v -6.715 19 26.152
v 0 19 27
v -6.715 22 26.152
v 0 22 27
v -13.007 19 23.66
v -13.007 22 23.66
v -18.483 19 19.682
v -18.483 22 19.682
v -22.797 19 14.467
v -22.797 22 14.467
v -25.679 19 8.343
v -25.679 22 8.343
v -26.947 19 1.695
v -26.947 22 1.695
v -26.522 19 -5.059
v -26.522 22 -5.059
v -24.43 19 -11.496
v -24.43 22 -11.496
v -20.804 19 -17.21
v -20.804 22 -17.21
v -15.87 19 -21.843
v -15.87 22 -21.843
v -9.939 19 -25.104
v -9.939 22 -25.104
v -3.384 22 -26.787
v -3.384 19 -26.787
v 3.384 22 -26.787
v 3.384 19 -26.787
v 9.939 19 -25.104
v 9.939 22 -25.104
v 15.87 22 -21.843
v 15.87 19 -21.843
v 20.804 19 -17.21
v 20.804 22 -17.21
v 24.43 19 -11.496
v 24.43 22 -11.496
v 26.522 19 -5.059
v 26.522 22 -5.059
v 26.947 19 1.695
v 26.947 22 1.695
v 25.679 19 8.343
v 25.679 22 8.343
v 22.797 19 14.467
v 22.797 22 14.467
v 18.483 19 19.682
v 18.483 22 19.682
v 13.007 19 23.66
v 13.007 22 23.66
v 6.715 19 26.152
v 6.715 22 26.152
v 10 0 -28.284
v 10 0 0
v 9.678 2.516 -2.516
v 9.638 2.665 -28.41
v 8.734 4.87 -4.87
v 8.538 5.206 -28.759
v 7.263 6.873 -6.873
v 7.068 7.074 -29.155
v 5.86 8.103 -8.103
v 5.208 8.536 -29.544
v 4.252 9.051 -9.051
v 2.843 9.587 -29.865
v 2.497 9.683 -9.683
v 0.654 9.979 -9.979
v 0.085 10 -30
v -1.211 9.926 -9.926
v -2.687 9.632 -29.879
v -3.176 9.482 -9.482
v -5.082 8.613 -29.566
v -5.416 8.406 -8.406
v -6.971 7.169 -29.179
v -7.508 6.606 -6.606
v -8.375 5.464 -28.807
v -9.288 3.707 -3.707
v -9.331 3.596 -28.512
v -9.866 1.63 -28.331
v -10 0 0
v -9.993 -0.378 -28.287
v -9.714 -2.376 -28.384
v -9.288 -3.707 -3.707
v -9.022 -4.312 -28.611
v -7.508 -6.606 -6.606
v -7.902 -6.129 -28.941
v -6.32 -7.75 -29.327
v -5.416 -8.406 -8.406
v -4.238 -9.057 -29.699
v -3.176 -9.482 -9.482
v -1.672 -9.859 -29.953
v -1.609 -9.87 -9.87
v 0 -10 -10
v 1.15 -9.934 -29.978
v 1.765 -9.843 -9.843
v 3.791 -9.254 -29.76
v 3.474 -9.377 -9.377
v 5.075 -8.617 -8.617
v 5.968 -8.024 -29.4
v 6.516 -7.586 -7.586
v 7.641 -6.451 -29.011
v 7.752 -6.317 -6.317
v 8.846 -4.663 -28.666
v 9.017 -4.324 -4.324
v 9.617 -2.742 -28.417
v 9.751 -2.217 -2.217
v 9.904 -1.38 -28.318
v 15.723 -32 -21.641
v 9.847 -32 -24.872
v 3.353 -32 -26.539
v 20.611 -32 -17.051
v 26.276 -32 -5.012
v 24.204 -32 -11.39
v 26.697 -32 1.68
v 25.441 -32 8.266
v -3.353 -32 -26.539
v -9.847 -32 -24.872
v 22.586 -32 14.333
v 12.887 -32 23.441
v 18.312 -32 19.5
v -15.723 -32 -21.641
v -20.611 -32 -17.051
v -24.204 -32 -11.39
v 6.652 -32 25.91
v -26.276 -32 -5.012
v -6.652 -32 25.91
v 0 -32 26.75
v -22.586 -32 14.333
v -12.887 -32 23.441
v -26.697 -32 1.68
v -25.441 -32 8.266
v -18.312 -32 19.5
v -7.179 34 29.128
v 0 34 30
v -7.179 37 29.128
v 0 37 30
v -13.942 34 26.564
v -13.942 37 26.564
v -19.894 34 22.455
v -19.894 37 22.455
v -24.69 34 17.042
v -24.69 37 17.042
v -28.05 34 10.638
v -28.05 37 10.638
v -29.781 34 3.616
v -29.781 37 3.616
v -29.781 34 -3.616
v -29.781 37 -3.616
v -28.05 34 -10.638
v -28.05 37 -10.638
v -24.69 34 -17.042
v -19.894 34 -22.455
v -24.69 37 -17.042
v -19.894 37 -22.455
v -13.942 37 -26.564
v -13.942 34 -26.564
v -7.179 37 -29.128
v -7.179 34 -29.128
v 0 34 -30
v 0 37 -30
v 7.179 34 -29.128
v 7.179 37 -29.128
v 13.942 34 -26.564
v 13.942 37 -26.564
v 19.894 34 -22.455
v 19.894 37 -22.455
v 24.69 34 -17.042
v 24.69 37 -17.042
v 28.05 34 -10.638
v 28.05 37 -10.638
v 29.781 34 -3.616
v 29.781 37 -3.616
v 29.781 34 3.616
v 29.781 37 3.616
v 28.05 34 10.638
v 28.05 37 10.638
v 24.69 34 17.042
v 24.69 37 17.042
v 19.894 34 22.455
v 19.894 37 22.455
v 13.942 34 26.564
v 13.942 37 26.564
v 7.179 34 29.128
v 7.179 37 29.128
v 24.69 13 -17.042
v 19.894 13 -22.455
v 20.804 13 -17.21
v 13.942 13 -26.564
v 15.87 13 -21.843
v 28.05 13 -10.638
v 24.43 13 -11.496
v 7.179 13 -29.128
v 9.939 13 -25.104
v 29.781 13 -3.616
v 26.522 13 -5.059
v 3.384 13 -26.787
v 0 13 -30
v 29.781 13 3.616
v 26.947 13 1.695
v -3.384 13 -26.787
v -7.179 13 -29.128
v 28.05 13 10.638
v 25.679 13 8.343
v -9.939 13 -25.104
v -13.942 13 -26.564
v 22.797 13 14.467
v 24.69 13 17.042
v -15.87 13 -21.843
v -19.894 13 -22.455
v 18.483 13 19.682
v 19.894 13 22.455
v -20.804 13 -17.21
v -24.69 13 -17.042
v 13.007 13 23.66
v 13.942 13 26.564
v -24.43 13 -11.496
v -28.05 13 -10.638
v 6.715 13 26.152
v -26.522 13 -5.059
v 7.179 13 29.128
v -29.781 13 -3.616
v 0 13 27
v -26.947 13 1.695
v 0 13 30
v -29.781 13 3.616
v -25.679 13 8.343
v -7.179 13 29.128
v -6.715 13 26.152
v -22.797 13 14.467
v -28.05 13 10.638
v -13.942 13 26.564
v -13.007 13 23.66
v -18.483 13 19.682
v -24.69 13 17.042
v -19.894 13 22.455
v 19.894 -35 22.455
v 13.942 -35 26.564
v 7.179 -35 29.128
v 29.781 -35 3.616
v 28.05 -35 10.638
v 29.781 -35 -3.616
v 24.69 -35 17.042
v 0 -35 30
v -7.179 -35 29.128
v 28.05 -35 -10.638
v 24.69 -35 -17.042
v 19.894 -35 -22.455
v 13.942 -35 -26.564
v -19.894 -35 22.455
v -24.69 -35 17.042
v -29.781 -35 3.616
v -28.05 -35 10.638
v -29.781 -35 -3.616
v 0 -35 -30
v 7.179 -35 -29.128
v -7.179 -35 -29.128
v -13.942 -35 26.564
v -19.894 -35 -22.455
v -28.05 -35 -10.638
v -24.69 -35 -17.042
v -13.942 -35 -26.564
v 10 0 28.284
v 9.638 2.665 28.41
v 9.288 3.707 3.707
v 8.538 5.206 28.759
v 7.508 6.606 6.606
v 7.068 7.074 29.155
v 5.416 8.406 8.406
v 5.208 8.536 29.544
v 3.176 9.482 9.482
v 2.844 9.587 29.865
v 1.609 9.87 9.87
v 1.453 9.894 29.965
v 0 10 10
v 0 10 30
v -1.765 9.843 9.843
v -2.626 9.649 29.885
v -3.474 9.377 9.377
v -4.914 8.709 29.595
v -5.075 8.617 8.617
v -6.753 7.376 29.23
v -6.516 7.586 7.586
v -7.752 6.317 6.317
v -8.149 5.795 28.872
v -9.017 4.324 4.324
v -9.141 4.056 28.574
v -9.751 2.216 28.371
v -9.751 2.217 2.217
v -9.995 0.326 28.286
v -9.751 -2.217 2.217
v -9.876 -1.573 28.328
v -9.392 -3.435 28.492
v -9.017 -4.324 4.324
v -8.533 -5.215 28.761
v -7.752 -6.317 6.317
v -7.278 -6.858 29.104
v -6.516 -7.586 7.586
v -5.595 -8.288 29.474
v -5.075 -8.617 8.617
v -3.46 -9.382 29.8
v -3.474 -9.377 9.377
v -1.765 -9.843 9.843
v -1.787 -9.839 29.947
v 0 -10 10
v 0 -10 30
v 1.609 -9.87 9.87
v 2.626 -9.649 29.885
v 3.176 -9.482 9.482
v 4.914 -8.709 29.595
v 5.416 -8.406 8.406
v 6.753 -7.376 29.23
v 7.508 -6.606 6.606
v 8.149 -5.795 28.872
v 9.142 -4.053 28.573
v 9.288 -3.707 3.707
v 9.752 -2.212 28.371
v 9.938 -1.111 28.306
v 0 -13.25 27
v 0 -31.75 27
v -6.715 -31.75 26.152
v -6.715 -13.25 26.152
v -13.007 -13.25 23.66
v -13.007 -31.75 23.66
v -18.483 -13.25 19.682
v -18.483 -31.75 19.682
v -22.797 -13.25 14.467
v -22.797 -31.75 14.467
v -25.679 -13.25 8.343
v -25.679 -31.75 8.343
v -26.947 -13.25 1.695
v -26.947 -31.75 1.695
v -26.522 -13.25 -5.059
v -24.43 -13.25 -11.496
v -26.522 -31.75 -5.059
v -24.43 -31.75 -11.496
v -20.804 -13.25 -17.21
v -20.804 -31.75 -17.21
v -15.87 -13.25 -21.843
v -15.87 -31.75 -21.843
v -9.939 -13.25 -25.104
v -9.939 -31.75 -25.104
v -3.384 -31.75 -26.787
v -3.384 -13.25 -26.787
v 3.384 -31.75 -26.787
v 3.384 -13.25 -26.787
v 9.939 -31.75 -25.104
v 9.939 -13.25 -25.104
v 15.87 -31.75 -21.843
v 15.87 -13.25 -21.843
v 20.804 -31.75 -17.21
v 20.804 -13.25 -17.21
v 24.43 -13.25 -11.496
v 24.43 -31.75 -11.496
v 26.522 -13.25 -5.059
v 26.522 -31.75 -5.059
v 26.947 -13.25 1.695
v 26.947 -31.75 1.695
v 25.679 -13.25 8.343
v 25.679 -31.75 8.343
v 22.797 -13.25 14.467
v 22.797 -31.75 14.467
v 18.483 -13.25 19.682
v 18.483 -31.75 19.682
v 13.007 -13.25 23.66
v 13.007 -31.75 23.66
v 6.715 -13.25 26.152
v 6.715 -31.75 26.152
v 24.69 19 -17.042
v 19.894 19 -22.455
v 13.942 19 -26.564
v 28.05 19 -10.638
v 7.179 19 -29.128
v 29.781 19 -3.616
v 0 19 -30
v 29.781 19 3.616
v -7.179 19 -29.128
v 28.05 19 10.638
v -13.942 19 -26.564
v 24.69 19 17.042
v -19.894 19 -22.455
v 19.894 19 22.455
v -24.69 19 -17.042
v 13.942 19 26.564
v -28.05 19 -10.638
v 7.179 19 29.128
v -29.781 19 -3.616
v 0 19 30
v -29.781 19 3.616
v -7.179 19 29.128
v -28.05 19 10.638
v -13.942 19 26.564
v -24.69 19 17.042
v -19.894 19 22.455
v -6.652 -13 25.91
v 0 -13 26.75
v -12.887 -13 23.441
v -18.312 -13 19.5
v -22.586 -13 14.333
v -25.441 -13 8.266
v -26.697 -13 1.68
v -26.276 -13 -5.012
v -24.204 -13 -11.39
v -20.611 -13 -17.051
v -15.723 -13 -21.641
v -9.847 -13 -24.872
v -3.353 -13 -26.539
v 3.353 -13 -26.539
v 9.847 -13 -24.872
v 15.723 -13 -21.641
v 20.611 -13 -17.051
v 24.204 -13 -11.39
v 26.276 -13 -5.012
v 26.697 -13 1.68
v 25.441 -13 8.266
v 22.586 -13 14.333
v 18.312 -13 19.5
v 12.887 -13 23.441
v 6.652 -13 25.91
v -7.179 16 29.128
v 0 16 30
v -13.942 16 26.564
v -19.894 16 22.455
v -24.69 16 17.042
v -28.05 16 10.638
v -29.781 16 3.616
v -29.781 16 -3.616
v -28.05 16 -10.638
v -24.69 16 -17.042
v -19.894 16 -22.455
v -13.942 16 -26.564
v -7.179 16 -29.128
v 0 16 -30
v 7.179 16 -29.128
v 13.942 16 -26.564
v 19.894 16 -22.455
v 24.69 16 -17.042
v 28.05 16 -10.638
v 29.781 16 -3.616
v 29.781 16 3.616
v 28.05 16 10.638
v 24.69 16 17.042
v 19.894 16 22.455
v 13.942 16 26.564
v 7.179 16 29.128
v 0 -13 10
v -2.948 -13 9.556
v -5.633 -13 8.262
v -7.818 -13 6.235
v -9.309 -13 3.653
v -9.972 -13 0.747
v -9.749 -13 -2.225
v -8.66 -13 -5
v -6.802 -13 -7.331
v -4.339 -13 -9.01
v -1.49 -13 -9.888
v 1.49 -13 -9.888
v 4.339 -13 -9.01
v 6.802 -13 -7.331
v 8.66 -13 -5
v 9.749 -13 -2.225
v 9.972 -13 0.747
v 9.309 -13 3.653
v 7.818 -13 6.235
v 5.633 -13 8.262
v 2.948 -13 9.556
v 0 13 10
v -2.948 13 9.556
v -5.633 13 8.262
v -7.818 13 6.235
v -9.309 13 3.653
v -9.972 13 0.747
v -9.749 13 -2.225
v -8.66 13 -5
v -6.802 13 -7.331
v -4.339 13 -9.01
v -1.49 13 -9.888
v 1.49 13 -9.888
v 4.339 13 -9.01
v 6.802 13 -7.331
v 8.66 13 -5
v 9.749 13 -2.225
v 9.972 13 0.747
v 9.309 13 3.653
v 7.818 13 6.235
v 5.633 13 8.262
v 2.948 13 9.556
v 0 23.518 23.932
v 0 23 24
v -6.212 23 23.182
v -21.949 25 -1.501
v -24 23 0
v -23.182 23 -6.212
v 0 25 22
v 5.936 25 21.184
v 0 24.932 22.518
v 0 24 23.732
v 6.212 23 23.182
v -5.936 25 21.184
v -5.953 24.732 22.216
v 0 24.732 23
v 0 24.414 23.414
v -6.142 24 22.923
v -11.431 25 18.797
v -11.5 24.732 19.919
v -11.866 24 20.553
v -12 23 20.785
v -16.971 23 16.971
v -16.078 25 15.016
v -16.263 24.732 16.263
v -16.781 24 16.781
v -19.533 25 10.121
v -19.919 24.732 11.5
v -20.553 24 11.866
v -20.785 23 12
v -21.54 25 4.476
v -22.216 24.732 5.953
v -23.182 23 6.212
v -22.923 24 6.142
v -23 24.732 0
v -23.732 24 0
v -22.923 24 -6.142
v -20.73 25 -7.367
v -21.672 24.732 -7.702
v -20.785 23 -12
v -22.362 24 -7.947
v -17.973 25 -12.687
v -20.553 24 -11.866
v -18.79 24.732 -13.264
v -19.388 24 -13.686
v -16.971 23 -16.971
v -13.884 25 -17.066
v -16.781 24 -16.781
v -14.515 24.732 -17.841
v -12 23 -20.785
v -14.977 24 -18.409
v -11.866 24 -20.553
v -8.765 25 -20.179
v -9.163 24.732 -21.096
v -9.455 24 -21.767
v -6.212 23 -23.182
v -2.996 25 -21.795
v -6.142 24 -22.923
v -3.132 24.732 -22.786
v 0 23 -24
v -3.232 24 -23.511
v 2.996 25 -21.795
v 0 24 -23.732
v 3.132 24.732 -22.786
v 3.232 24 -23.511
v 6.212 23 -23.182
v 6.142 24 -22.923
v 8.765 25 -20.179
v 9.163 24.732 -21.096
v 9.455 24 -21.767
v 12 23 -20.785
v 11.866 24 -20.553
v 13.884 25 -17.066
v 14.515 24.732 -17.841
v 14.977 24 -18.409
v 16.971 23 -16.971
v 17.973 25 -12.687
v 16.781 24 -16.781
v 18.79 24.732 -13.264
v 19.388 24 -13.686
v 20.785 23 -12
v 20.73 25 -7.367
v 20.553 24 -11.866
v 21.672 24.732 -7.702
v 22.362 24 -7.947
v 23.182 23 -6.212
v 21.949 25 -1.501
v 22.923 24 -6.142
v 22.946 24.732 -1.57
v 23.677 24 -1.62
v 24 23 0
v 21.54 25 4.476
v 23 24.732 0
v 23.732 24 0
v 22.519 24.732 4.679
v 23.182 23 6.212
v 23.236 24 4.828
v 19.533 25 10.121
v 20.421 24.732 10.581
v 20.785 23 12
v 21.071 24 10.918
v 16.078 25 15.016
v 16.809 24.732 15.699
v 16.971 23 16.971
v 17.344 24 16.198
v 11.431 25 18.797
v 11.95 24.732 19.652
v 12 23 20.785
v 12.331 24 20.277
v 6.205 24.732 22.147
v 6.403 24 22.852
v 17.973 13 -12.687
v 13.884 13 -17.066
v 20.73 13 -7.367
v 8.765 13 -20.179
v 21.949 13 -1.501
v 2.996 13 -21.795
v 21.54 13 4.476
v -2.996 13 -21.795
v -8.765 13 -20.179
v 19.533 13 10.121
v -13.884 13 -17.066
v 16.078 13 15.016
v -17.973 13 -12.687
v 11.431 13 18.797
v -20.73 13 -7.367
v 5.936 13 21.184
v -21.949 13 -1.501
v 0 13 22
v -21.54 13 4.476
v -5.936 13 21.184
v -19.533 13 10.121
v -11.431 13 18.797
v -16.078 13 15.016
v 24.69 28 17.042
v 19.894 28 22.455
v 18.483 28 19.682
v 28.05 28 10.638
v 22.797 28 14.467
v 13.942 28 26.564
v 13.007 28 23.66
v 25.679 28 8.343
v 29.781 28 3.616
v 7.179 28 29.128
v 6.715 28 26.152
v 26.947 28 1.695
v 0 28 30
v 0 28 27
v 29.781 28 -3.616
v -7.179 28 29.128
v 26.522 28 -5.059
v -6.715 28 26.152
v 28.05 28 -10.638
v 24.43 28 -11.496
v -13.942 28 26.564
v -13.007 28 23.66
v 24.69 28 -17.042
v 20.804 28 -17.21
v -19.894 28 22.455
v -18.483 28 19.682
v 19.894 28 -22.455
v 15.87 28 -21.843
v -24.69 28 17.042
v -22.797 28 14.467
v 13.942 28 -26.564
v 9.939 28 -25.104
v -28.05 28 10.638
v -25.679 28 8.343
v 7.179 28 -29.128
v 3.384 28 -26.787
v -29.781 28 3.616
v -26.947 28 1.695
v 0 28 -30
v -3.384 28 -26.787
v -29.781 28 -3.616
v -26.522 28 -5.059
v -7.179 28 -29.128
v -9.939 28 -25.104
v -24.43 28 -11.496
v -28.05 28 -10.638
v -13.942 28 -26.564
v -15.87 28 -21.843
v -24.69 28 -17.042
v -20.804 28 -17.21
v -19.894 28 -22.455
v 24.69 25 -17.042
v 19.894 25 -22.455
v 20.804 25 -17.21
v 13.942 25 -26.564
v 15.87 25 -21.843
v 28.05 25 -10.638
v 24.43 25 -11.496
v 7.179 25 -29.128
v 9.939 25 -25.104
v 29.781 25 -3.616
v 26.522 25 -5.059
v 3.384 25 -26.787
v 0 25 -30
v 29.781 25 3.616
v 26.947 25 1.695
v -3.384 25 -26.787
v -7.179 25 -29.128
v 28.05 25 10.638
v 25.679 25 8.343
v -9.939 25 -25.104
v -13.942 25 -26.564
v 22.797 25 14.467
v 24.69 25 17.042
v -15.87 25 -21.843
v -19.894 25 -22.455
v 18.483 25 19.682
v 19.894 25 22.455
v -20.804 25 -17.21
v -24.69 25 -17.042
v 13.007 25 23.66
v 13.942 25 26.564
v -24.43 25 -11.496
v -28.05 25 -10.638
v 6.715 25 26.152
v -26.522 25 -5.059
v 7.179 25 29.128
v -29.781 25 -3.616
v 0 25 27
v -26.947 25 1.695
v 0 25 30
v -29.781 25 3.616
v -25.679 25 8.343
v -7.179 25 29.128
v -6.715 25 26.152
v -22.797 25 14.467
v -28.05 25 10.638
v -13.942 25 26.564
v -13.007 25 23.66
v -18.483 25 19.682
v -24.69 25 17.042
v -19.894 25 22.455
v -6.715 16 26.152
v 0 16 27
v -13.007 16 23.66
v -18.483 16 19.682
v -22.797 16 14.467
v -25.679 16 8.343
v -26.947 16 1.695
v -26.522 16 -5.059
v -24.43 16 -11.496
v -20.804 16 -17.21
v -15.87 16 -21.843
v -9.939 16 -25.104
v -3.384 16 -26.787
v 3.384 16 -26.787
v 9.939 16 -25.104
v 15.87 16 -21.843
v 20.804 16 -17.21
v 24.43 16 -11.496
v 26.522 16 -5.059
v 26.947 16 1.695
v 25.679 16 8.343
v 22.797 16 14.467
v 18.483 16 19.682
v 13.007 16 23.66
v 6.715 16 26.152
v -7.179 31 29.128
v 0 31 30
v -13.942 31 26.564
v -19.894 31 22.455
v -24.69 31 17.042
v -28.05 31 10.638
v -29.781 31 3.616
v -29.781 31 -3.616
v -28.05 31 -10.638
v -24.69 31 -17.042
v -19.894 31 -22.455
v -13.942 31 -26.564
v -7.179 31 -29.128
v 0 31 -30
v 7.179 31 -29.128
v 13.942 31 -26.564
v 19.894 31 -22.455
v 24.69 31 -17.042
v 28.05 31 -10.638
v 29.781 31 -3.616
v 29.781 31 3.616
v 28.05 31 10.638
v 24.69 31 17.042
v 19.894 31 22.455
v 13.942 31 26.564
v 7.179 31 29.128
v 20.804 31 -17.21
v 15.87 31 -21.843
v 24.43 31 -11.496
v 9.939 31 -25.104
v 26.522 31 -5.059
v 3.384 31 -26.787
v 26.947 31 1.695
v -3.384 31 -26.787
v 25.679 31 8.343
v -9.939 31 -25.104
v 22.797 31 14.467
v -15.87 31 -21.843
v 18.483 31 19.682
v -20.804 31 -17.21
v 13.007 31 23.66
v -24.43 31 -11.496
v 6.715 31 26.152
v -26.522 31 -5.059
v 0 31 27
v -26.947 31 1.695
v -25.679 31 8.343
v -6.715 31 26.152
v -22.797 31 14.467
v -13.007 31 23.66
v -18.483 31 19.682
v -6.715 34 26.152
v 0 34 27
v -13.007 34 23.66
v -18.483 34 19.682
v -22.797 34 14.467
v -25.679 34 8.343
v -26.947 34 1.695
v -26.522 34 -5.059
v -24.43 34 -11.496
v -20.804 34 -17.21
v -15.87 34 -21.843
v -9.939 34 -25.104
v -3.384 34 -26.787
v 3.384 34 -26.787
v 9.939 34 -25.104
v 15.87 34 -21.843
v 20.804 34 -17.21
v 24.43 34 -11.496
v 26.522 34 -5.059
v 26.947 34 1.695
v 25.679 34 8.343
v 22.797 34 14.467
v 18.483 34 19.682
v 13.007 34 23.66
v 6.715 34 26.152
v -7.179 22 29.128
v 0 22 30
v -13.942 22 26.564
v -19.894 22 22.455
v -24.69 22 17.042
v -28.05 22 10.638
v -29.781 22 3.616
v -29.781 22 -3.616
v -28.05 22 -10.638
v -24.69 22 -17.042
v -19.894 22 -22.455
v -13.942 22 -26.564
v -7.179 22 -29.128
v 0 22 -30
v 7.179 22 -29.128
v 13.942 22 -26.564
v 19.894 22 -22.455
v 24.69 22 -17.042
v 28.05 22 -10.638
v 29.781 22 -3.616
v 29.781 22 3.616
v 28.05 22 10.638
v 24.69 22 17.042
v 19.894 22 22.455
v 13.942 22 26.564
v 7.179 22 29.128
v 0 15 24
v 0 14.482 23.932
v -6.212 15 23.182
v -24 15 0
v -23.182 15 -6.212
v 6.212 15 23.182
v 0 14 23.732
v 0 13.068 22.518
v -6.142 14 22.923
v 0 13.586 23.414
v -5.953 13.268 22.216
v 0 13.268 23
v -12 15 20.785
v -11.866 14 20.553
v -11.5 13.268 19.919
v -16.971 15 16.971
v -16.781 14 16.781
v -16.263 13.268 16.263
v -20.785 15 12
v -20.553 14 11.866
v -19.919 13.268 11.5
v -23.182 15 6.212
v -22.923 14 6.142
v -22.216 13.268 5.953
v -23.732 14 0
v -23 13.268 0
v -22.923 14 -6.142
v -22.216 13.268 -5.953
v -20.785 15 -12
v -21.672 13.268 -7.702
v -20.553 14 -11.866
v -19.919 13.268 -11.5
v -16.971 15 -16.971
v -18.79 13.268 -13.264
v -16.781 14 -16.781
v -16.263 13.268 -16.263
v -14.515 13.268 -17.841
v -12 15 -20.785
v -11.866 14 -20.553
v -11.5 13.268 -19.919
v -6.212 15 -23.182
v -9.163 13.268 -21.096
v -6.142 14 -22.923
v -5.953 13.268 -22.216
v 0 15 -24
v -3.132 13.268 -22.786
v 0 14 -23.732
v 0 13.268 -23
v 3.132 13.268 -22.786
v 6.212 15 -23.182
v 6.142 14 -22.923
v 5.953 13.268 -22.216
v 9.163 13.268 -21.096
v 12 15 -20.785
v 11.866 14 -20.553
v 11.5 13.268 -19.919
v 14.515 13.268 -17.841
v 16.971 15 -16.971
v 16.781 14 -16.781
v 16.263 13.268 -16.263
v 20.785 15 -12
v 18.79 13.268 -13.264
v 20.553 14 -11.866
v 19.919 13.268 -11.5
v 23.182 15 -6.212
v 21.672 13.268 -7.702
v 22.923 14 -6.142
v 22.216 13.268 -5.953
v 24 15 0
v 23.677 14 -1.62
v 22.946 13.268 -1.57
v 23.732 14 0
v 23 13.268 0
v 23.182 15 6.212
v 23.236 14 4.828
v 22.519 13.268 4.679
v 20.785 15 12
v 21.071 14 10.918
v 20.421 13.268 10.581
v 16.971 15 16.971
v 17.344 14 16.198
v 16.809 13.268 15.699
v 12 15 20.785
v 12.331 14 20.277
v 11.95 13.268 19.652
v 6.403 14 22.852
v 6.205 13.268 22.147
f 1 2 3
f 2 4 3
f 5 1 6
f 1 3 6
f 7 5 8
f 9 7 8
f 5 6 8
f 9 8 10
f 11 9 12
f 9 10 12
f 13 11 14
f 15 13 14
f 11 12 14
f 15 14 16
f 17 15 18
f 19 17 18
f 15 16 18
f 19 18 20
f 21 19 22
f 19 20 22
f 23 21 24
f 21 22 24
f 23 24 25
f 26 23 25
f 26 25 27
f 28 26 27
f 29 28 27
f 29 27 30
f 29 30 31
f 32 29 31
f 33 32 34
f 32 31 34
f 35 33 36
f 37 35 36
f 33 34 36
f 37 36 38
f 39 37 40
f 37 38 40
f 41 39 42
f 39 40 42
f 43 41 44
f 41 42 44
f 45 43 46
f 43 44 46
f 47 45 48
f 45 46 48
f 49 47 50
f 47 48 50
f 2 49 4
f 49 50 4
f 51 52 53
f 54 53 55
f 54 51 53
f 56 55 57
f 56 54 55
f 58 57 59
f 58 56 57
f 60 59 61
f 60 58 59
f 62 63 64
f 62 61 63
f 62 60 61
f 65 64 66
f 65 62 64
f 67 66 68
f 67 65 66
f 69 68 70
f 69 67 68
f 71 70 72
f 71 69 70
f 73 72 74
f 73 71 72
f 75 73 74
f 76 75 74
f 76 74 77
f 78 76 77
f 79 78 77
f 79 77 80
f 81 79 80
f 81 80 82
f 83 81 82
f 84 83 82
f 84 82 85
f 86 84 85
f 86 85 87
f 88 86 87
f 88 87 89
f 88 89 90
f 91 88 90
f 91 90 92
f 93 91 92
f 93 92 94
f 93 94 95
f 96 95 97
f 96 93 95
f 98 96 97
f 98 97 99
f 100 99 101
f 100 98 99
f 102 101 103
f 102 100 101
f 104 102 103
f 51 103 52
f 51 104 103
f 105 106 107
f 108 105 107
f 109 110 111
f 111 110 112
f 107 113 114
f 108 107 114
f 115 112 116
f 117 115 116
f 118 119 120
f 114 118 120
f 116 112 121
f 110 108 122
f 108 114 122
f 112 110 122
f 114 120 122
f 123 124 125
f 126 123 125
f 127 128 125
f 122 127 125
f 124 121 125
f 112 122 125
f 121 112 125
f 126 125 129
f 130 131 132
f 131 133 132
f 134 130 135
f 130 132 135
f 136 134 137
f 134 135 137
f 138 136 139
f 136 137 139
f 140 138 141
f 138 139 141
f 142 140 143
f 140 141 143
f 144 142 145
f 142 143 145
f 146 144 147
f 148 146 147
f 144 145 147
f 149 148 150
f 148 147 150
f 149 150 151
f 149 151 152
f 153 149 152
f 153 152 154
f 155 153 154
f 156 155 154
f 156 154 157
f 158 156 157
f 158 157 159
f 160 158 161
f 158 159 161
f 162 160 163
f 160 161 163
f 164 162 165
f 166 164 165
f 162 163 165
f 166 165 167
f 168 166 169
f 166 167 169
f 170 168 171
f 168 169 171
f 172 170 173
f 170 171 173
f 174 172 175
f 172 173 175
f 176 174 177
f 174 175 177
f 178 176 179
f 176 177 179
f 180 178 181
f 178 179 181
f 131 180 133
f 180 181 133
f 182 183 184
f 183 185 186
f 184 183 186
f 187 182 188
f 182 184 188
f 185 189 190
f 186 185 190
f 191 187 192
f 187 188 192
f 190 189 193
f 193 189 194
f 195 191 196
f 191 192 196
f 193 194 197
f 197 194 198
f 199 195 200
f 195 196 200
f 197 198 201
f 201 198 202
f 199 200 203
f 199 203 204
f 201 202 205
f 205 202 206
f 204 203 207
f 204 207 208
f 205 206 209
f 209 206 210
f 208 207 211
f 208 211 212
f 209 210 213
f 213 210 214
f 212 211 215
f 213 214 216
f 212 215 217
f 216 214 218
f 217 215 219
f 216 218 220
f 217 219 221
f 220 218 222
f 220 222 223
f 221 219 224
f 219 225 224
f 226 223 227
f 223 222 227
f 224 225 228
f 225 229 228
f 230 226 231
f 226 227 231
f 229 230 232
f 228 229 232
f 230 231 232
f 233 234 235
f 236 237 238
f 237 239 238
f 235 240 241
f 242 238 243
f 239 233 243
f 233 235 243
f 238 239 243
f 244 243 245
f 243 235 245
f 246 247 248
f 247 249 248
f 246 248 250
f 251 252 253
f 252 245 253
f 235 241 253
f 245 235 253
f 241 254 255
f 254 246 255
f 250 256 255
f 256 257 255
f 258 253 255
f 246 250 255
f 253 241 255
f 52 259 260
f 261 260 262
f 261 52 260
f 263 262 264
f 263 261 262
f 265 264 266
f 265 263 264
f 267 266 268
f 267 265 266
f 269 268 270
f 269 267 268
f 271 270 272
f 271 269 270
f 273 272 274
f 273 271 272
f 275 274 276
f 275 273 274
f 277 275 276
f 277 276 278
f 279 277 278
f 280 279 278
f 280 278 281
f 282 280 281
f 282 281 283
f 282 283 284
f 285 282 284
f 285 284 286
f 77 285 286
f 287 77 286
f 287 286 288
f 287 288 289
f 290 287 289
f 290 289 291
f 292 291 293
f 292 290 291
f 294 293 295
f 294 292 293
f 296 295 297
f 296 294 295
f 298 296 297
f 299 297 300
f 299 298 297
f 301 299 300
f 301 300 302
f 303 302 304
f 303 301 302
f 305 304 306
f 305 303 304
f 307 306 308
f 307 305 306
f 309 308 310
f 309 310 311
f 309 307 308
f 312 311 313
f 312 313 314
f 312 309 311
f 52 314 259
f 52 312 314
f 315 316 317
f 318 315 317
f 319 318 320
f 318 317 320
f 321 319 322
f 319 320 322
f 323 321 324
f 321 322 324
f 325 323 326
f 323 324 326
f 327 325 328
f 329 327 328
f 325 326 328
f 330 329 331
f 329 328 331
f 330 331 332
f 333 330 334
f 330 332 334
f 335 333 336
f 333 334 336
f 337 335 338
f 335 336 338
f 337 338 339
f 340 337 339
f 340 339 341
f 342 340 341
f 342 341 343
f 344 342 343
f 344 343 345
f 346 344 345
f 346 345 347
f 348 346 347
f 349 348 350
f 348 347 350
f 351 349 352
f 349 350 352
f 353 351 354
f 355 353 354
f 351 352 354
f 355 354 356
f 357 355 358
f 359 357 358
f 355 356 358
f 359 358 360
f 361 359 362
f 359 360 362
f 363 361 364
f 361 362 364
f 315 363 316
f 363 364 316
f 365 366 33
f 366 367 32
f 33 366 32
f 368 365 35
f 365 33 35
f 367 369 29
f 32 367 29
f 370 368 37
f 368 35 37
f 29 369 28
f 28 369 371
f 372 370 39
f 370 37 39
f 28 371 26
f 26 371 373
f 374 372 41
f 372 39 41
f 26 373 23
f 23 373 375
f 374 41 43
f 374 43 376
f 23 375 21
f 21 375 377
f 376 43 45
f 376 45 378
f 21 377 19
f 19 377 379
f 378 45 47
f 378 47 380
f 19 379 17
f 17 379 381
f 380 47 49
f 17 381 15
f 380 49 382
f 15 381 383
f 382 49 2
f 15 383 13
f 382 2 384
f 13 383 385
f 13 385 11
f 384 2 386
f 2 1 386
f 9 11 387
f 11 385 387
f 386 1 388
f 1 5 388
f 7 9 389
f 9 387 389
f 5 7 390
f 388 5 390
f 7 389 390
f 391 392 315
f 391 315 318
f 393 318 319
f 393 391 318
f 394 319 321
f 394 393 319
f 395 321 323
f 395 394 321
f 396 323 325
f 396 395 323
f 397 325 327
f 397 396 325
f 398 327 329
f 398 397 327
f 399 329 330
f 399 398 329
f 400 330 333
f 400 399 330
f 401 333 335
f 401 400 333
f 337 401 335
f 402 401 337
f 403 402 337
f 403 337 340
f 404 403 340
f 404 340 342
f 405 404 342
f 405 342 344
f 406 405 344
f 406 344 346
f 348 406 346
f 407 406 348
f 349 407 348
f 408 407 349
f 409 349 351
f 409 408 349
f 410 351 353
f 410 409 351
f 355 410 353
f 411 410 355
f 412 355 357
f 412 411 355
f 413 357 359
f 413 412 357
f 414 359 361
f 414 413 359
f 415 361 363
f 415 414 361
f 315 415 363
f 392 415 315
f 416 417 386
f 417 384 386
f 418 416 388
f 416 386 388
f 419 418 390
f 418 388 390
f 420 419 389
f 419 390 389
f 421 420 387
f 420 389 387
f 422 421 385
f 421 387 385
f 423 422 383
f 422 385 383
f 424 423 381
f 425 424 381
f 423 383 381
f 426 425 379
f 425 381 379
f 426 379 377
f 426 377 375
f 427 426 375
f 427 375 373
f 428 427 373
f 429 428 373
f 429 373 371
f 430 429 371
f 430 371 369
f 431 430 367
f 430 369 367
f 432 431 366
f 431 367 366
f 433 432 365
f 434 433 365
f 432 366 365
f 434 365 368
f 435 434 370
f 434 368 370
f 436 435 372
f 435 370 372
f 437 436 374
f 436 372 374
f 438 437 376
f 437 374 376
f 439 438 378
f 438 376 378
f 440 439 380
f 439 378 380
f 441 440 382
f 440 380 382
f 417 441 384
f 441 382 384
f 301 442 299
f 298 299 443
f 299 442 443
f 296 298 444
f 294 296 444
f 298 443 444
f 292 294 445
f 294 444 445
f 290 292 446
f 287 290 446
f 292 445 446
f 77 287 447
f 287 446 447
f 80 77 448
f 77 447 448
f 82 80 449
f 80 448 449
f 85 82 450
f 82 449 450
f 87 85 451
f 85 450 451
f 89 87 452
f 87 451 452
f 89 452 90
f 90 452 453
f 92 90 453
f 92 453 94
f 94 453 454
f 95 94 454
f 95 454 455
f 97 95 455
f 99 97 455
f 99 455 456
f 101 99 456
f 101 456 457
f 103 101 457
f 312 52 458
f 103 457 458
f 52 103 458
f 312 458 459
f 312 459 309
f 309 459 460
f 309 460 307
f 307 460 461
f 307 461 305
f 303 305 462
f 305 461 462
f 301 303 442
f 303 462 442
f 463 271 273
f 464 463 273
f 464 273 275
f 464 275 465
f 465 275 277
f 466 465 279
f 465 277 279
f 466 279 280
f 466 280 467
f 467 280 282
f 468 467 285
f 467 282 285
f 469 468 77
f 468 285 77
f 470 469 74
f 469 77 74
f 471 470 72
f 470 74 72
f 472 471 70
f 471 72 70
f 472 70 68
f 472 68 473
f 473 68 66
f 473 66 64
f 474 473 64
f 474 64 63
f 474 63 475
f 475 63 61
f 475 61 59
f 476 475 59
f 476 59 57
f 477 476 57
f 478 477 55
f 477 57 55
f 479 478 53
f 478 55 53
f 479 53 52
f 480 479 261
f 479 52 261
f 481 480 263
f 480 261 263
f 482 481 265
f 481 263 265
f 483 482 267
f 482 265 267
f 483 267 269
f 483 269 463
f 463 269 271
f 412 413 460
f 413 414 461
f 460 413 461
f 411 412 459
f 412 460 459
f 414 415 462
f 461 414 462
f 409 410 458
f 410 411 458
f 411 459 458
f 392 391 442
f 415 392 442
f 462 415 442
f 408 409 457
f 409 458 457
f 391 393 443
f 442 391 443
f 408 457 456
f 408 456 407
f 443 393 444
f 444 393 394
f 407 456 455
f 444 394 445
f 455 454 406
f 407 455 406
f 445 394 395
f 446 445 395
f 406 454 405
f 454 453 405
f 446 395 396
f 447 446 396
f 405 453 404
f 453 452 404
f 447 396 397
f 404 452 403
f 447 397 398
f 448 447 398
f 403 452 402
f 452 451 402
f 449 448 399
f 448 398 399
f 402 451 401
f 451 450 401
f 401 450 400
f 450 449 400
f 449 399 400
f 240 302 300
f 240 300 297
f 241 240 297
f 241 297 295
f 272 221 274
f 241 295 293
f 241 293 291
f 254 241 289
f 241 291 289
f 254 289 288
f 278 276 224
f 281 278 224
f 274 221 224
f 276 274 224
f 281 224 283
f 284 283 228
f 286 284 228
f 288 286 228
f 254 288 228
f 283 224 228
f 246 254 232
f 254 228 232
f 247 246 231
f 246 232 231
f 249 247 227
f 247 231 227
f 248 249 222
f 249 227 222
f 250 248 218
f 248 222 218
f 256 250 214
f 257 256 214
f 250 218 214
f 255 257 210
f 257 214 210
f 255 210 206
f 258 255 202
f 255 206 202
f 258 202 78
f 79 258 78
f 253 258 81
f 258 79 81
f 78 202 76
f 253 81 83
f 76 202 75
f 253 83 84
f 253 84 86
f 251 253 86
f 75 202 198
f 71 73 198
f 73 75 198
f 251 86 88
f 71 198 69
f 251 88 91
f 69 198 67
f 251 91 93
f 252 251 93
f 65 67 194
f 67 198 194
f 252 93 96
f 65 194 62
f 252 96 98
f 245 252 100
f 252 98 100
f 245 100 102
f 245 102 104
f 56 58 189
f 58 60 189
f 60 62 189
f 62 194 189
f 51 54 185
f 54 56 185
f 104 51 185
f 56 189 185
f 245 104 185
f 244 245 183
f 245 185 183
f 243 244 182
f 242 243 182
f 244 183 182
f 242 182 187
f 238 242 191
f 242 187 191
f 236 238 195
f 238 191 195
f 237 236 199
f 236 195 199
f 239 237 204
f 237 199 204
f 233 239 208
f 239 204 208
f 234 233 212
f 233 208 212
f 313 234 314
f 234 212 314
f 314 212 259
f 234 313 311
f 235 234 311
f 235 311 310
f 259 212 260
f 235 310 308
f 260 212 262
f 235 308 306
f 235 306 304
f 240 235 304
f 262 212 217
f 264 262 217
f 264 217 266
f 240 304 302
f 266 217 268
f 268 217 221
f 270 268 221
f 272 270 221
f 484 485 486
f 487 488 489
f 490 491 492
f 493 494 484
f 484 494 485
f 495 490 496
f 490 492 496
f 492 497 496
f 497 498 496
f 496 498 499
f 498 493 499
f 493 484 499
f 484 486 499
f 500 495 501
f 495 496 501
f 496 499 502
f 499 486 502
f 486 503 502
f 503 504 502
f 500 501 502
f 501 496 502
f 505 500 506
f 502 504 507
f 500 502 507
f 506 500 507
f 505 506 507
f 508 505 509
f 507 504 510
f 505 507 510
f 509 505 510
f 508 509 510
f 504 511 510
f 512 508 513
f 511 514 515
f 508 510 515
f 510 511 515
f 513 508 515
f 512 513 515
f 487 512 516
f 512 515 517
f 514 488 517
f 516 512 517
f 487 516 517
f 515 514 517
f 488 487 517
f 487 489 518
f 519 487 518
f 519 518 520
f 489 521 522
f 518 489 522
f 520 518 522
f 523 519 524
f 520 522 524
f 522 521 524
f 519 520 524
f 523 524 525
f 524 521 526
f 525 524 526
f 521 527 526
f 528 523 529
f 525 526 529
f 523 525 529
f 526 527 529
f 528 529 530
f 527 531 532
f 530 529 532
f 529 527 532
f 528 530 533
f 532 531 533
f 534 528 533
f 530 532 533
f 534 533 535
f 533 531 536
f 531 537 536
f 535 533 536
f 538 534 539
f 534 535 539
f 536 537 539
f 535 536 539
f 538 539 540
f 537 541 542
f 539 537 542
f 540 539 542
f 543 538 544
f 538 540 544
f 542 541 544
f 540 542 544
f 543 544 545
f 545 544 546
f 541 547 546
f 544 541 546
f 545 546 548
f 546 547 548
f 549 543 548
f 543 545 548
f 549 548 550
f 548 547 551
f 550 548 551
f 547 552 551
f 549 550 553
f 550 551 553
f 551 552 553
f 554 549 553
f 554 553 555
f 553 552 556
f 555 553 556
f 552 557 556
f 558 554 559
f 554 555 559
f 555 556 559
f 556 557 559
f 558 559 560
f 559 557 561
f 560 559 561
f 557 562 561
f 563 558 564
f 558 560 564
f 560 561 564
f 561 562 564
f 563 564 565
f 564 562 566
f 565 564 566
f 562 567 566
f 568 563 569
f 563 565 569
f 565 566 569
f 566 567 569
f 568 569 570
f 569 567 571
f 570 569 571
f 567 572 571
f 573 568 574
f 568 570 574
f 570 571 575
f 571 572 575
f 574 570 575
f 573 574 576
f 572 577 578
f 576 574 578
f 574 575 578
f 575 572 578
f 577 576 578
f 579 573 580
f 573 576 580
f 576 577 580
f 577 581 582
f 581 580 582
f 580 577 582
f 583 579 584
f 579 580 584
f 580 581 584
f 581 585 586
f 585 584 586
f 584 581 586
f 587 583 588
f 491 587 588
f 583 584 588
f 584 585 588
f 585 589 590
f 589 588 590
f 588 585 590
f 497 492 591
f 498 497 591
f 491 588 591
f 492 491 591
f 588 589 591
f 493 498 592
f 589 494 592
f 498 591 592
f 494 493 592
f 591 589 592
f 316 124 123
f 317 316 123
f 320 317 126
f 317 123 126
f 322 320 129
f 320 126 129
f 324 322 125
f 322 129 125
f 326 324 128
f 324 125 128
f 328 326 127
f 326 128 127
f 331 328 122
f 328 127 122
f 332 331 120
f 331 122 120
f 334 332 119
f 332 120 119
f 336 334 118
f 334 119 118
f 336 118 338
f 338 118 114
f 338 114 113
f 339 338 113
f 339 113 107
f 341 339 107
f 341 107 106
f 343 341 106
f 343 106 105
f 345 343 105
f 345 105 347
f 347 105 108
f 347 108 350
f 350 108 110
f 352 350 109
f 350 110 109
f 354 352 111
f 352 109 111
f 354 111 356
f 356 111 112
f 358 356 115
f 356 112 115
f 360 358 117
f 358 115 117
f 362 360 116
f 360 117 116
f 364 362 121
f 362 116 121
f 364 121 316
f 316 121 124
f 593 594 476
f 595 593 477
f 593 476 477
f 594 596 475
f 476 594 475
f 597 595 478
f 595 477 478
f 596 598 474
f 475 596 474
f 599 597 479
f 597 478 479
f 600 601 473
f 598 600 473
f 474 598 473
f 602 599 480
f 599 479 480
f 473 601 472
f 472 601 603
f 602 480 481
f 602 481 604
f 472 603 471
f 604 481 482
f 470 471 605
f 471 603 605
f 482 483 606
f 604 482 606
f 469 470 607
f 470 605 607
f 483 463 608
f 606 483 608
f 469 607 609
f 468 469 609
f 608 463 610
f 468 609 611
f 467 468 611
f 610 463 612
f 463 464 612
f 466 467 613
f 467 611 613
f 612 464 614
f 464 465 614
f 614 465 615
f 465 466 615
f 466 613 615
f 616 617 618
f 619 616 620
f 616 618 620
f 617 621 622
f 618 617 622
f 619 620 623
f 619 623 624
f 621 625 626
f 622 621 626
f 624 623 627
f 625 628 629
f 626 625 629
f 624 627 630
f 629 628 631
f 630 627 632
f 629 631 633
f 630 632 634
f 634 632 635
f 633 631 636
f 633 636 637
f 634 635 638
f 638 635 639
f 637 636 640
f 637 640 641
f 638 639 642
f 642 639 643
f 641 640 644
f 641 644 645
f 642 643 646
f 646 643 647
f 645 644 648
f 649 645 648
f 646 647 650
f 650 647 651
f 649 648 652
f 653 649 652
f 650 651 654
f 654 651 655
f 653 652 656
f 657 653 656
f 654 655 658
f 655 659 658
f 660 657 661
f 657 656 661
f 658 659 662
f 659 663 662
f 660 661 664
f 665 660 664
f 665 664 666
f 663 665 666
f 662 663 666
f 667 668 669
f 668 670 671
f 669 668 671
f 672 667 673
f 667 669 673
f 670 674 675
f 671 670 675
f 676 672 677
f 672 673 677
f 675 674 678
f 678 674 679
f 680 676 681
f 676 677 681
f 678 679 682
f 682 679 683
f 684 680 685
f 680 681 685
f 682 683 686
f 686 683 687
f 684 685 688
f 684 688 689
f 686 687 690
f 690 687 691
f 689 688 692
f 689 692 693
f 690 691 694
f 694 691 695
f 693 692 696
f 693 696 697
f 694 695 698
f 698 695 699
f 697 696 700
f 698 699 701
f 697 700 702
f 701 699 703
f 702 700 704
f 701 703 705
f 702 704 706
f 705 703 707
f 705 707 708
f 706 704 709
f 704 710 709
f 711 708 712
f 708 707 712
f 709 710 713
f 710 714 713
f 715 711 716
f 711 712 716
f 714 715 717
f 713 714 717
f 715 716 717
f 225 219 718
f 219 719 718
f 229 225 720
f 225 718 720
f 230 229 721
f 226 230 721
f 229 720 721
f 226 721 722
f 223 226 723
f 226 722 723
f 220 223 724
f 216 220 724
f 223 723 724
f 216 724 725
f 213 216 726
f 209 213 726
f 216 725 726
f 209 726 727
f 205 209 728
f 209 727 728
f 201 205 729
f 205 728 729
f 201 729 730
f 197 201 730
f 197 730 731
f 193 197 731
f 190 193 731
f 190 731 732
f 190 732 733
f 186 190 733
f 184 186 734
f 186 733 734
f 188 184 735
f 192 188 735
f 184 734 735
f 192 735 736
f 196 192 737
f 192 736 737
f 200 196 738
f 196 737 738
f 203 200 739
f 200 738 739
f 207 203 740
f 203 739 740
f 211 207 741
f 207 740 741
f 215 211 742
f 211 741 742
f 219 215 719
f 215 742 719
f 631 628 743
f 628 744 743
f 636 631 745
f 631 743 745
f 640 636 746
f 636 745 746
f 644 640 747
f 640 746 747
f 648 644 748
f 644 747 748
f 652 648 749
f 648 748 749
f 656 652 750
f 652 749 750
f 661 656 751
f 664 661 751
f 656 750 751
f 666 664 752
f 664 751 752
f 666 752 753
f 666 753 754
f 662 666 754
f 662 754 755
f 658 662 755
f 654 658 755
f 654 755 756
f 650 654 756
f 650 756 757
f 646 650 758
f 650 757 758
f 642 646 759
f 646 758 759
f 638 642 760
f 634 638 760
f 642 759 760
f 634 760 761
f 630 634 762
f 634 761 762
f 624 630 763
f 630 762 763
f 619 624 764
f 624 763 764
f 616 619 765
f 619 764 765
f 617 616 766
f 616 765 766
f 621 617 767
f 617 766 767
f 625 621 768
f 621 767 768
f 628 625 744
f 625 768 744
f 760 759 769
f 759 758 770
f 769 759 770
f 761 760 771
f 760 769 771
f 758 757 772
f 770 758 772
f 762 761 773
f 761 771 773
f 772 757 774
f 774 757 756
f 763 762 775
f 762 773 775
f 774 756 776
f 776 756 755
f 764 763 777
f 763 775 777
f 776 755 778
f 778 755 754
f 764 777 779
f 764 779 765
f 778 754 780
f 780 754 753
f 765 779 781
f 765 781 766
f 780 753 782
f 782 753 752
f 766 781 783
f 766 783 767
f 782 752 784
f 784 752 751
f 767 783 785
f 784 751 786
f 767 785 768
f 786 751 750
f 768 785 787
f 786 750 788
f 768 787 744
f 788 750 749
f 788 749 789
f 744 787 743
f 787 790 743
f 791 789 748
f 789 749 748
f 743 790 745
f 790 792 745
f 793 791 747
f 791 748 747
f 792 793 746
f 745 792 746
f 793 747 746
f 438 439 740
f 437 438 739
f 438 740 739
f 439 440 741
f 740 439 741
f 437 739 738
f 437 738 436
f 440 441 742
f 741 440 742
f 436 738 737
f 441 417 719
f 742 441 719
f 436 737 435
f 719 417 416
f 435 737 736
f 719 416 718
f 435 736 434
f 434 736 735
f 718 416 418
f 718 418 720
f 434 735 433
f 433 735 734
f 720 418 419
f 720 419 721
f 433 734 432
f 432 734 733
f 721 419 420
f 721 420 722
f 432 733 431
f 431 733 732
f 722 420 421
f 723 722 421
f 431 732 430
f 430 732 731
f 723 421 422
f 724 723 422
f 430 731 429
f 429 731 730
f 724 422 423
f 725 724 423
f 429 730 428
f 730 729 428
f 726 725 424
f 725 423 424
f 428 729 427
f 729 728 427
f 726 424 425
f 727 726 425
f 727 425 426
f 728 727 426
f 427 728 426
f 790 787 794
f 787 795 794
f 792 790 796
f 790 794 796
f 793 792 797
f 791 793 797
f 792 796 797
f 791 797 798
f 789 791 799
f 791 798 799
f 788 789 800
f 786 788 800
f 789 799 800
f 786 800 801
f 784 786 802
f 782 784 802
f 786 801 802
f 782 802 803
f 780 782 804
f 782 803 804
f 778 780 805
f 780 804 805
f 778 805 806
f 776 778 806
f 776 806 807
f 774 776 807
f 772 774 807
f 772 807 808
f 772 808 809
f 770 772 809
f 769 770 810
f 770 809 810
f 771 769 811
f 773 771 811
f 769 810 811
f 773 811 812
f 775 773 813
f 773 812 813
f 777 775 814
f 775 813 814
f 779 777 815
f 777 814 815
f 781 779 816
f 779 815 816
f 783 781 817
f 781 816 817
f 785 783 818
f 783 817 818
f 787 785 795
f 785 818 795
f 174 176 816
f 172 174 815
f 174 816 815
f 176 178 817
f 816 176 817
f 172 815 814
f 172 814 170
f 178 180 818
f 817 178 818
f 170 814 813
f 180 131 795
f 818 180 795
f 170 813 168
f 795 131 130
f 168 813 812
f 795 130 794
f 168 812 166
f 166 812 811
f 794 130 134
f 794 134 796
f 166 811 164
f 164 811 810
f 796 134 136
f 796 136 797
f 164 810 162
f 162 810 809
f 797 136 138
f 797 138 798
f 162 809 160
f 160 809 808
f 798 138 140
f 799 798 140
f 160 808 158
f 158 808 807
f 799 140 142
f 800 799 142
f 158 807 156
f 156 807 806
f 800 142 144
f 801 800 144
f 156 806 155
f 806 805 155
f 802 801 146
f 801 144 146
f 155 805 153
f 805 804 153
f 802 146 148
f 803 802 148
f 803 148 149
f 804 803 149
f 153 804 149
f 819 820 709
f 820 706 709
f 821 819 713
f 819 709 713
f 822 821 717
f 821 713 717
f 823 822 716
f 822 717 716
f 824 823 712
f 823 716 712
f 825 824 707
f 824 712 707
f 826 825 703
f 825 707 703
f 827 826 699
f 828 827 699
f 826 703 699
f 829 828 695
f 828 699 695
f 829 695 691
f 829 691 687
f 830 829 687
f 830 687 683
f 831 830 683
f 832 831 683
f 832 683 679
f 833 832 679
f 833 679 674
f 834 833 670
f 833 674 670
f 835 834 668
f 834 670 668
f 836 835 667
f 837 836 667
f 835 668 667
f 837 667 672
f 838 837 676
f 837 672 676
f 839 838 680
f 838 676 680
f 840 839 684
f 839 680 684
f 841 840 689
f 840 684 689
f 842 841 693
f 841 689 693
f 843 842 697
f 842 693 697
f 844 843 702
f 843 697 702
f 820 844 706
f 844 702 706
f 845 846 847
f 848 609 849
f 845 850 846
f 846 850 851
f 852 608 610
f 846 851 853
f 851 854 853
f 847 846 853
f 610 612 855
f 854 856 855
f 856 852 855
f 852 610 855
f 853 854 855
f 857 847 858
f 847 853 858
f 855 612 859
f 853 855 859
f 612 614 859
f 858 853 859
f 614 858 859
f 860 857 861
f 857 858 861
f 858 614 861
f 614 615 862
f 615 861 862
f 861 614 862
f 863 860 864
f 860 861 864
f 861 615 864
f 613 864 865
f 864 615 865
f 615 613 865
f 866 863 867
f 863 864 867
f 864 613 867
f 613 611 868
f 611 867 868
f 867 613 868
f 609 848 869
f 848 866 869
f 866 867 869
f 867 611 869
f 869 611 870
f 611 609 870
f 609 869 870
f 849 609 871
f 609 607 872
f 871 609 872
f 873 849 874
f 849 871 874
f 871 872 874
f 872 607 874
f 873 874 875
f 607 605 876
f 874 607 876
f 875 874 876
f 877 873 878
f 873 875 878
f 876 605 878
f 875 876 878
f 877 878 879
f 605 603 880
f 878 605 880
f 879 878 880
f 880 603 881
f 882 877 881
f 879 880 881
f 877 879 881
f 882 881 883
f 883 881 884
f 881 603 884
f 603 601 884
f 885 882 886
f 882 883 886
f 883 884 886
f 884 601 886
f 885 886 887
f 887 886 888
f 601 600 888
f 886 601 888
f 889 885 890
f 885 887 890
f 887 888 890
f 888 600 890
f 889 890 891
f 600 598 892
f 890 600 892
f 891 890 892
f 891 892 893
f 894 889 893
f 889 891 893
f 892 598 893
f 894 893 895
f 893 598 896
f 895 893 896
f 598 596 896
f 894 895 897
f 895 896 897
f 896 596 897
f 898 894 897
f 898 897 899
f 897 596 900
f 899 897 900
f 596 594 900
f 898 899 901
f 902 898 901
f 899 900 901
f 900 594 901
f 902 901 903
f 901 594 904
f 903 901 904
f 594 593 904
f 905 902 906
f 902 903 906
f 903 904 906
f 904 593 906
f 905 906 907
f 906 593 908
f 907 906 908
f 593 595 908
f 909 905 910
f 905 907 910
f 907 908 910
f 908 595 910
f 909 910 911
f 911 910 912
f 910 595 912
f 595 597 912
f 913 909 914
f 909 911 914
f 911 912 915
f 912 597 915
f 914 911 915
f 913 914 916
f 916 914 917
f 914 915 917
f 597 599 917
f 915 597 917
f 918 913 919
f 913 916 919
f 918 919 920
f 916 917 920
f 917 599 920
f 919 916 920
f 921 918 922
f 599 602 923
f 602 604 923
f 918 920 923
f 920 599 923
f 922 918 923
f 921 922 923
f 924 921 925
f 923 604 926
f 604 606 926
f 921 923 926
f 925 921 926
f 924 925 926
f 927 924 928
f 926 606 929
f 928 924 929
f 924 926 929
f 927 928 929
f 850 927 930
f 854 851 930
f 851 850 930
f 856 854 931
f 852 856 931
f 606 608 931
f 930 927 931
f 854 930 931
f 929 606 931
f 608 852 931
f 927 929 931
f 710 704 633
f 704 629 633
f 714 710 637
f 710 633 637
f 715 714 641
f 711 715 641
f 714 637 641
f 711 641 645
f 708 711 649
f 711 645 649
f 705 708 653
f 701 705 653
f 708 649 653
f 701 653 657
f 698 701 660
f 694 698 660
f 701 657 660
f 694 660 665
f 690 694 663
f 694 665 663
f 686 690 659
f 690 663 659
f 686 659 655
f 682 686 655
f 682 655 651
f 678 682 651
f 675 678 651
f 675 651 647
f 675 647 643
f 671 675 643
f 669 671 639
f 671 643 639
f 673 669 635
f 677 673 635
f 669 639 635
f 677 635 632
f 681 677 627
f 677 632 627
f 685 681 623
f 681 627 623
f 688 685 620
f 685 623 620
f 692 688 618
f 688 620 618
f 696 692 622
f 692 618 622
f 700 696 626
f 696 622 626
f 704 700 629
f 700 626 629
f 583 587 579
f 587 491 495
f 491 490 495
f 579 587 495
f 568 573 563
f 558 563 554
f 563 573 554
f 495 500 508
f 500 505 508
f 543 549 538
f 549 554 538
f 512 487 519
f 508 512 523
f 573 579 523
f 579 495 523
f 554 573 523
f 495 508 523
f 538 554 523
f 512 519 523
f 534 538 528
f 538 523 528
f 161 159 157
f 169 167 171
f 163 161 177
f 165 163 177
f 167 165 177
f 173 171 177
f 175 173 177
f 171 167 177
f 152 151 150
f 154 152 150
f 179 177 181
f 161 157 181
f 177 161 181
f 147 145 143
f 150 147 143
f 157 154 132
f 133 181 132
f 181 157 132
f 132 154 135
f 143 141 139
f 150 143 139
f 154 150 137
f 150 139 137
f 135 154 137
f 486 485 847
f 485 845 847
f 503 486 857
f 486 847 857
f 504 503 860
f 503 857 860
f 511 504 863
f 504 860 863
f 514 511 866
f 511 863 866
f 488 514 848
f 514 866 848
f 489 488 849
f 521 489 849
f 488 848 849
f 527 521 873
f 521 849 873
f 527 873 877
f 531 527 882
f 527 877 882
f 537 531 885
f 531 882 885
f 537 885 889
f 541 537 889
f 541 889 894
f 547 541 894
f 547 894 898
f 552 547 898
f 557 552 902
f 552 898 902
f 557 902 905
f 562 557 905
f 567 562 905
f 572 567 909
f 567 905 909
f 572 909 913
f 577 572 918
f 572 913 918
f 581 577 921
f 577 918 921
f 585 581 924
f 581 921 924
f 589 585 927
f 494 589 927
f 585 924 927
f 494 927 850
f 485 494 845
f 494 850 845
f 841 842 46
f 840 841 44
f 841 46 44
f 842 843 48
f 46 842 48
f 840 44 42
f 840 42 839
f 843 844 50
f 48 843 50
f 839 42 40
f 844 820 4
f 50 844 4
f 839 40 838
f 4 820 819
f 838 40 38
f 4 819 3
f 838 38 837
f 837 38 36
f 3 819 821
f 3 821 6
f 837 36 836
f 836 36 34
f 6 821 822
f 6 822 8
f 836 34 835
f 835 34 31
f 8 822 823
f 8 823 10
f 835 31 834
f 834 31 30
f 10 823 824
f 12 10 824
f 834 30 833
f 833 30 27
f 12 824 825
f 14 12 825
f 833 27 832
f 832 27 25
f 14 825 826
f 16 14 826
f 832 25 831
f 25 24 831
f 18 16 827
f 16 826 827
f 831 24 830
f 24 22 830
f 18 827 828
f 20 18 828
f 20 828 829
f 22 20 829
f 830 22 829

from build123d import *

# Parameters (mm, degrees)
CUT_EXTRUDE7_DEPTH      = 57.29387178
CUT_EXTRUDE7_DEPTH_BACK = 57.29387178
SKETCH7_R               = 10
CHAMFER6_SIZE           = 0.25
CHAMFER7_SIZE           = 0.25


with BuildPart() as part:
    # Sketch1 → Revolve4 (revolve)
    with BuildSketch(Plane(origin=(0, 0, 0), x_dir=(0, 0, -1), z_dir=(1, 0, 0)), mode=Mode.PRIVATE) as revolve4_sk:
        with BuildLine():
            Line((30, 37), (0, 37))
            Line((0, 37), (0, 25))
            Line((0, 25), (22, 25))
            ThreePointArc((22, 25), (23.414213562, 24.414213562), (24, 23))
            Line((24, 23), (24, 15))
            ThreePointArc((24, 15), (23.414213562, 13.585786438), (22, 13))
            Line((22, 13), (10, 13))
            Line((10, 13), (10, -13))
            Line((10, -13), (27, -13))
            Line((27, -13), (27, -32))
            Line((27, -32), (0, -32))
            Line((0, -32), (0, -35))
            Line((0, -35), (30, -35))
            Line((30, -35), (30, 13))
            Line((30, 13), (27, 13))
            Line((27, 13), (27, 16))
            Line((27, 16), (30, 16))
            Line((30, 16), (30, 19))
            Line((30, 19), (27, 19))
            Line((27, 19), (27, 22))
            Line((27, 22), (30, 22))
            Line((30, 22), (30, 25))
            Line((30, 25), (27, 25))
            Line((27, 25), (27, 28))
            Line((27, 28), (30, 28))
            Line((30, 28), (30, 31))
            Line((30, 31), (27, 31))
            Line((27, 31), (27, 34))
            Line((27, 34), (30, 34))
            Line((30, 34), (30, 37))
        make_face()
    revolve(revolve4_sk.sketch.rotate(Axis((0, 50, 0), (0, -1, 0)), 180), axis=Axis((0, 50, 0), (0, -1, 0)))

    # Sketch7 → Cut-Extrude7 (cut, two sides: drawn at the far end of the back side and taken through both)
    with BuildSketch(Plane.XY.offset(-CUT_EXTRUDE7_DEPTH_BACK)):
        Circle(SKETCH7_R)
    extrude(amount=CUT_EXTRUDE7_DEPTH + CUT_EXTRUDE7_DEPTH_BACK, mode=Mode.SUBTRACT)

    # Chamfer6
    chamfer6_edges = [part.edges().sort_by_distance(p)[0] for p in [
        (0, -32, -27),
    ]]
    chamfer(chamfer6_edges, length=CHAMFER6_SIZE)

    # Chamfer7
    chamfer7_edges = [part.edges().sort_by_distance(p)[0] for p in [
        (0, -13, -27),
    ]]
    chamfer(chamfer7_edges, length=CHAMFER7_SIZE)


solid = part.part
